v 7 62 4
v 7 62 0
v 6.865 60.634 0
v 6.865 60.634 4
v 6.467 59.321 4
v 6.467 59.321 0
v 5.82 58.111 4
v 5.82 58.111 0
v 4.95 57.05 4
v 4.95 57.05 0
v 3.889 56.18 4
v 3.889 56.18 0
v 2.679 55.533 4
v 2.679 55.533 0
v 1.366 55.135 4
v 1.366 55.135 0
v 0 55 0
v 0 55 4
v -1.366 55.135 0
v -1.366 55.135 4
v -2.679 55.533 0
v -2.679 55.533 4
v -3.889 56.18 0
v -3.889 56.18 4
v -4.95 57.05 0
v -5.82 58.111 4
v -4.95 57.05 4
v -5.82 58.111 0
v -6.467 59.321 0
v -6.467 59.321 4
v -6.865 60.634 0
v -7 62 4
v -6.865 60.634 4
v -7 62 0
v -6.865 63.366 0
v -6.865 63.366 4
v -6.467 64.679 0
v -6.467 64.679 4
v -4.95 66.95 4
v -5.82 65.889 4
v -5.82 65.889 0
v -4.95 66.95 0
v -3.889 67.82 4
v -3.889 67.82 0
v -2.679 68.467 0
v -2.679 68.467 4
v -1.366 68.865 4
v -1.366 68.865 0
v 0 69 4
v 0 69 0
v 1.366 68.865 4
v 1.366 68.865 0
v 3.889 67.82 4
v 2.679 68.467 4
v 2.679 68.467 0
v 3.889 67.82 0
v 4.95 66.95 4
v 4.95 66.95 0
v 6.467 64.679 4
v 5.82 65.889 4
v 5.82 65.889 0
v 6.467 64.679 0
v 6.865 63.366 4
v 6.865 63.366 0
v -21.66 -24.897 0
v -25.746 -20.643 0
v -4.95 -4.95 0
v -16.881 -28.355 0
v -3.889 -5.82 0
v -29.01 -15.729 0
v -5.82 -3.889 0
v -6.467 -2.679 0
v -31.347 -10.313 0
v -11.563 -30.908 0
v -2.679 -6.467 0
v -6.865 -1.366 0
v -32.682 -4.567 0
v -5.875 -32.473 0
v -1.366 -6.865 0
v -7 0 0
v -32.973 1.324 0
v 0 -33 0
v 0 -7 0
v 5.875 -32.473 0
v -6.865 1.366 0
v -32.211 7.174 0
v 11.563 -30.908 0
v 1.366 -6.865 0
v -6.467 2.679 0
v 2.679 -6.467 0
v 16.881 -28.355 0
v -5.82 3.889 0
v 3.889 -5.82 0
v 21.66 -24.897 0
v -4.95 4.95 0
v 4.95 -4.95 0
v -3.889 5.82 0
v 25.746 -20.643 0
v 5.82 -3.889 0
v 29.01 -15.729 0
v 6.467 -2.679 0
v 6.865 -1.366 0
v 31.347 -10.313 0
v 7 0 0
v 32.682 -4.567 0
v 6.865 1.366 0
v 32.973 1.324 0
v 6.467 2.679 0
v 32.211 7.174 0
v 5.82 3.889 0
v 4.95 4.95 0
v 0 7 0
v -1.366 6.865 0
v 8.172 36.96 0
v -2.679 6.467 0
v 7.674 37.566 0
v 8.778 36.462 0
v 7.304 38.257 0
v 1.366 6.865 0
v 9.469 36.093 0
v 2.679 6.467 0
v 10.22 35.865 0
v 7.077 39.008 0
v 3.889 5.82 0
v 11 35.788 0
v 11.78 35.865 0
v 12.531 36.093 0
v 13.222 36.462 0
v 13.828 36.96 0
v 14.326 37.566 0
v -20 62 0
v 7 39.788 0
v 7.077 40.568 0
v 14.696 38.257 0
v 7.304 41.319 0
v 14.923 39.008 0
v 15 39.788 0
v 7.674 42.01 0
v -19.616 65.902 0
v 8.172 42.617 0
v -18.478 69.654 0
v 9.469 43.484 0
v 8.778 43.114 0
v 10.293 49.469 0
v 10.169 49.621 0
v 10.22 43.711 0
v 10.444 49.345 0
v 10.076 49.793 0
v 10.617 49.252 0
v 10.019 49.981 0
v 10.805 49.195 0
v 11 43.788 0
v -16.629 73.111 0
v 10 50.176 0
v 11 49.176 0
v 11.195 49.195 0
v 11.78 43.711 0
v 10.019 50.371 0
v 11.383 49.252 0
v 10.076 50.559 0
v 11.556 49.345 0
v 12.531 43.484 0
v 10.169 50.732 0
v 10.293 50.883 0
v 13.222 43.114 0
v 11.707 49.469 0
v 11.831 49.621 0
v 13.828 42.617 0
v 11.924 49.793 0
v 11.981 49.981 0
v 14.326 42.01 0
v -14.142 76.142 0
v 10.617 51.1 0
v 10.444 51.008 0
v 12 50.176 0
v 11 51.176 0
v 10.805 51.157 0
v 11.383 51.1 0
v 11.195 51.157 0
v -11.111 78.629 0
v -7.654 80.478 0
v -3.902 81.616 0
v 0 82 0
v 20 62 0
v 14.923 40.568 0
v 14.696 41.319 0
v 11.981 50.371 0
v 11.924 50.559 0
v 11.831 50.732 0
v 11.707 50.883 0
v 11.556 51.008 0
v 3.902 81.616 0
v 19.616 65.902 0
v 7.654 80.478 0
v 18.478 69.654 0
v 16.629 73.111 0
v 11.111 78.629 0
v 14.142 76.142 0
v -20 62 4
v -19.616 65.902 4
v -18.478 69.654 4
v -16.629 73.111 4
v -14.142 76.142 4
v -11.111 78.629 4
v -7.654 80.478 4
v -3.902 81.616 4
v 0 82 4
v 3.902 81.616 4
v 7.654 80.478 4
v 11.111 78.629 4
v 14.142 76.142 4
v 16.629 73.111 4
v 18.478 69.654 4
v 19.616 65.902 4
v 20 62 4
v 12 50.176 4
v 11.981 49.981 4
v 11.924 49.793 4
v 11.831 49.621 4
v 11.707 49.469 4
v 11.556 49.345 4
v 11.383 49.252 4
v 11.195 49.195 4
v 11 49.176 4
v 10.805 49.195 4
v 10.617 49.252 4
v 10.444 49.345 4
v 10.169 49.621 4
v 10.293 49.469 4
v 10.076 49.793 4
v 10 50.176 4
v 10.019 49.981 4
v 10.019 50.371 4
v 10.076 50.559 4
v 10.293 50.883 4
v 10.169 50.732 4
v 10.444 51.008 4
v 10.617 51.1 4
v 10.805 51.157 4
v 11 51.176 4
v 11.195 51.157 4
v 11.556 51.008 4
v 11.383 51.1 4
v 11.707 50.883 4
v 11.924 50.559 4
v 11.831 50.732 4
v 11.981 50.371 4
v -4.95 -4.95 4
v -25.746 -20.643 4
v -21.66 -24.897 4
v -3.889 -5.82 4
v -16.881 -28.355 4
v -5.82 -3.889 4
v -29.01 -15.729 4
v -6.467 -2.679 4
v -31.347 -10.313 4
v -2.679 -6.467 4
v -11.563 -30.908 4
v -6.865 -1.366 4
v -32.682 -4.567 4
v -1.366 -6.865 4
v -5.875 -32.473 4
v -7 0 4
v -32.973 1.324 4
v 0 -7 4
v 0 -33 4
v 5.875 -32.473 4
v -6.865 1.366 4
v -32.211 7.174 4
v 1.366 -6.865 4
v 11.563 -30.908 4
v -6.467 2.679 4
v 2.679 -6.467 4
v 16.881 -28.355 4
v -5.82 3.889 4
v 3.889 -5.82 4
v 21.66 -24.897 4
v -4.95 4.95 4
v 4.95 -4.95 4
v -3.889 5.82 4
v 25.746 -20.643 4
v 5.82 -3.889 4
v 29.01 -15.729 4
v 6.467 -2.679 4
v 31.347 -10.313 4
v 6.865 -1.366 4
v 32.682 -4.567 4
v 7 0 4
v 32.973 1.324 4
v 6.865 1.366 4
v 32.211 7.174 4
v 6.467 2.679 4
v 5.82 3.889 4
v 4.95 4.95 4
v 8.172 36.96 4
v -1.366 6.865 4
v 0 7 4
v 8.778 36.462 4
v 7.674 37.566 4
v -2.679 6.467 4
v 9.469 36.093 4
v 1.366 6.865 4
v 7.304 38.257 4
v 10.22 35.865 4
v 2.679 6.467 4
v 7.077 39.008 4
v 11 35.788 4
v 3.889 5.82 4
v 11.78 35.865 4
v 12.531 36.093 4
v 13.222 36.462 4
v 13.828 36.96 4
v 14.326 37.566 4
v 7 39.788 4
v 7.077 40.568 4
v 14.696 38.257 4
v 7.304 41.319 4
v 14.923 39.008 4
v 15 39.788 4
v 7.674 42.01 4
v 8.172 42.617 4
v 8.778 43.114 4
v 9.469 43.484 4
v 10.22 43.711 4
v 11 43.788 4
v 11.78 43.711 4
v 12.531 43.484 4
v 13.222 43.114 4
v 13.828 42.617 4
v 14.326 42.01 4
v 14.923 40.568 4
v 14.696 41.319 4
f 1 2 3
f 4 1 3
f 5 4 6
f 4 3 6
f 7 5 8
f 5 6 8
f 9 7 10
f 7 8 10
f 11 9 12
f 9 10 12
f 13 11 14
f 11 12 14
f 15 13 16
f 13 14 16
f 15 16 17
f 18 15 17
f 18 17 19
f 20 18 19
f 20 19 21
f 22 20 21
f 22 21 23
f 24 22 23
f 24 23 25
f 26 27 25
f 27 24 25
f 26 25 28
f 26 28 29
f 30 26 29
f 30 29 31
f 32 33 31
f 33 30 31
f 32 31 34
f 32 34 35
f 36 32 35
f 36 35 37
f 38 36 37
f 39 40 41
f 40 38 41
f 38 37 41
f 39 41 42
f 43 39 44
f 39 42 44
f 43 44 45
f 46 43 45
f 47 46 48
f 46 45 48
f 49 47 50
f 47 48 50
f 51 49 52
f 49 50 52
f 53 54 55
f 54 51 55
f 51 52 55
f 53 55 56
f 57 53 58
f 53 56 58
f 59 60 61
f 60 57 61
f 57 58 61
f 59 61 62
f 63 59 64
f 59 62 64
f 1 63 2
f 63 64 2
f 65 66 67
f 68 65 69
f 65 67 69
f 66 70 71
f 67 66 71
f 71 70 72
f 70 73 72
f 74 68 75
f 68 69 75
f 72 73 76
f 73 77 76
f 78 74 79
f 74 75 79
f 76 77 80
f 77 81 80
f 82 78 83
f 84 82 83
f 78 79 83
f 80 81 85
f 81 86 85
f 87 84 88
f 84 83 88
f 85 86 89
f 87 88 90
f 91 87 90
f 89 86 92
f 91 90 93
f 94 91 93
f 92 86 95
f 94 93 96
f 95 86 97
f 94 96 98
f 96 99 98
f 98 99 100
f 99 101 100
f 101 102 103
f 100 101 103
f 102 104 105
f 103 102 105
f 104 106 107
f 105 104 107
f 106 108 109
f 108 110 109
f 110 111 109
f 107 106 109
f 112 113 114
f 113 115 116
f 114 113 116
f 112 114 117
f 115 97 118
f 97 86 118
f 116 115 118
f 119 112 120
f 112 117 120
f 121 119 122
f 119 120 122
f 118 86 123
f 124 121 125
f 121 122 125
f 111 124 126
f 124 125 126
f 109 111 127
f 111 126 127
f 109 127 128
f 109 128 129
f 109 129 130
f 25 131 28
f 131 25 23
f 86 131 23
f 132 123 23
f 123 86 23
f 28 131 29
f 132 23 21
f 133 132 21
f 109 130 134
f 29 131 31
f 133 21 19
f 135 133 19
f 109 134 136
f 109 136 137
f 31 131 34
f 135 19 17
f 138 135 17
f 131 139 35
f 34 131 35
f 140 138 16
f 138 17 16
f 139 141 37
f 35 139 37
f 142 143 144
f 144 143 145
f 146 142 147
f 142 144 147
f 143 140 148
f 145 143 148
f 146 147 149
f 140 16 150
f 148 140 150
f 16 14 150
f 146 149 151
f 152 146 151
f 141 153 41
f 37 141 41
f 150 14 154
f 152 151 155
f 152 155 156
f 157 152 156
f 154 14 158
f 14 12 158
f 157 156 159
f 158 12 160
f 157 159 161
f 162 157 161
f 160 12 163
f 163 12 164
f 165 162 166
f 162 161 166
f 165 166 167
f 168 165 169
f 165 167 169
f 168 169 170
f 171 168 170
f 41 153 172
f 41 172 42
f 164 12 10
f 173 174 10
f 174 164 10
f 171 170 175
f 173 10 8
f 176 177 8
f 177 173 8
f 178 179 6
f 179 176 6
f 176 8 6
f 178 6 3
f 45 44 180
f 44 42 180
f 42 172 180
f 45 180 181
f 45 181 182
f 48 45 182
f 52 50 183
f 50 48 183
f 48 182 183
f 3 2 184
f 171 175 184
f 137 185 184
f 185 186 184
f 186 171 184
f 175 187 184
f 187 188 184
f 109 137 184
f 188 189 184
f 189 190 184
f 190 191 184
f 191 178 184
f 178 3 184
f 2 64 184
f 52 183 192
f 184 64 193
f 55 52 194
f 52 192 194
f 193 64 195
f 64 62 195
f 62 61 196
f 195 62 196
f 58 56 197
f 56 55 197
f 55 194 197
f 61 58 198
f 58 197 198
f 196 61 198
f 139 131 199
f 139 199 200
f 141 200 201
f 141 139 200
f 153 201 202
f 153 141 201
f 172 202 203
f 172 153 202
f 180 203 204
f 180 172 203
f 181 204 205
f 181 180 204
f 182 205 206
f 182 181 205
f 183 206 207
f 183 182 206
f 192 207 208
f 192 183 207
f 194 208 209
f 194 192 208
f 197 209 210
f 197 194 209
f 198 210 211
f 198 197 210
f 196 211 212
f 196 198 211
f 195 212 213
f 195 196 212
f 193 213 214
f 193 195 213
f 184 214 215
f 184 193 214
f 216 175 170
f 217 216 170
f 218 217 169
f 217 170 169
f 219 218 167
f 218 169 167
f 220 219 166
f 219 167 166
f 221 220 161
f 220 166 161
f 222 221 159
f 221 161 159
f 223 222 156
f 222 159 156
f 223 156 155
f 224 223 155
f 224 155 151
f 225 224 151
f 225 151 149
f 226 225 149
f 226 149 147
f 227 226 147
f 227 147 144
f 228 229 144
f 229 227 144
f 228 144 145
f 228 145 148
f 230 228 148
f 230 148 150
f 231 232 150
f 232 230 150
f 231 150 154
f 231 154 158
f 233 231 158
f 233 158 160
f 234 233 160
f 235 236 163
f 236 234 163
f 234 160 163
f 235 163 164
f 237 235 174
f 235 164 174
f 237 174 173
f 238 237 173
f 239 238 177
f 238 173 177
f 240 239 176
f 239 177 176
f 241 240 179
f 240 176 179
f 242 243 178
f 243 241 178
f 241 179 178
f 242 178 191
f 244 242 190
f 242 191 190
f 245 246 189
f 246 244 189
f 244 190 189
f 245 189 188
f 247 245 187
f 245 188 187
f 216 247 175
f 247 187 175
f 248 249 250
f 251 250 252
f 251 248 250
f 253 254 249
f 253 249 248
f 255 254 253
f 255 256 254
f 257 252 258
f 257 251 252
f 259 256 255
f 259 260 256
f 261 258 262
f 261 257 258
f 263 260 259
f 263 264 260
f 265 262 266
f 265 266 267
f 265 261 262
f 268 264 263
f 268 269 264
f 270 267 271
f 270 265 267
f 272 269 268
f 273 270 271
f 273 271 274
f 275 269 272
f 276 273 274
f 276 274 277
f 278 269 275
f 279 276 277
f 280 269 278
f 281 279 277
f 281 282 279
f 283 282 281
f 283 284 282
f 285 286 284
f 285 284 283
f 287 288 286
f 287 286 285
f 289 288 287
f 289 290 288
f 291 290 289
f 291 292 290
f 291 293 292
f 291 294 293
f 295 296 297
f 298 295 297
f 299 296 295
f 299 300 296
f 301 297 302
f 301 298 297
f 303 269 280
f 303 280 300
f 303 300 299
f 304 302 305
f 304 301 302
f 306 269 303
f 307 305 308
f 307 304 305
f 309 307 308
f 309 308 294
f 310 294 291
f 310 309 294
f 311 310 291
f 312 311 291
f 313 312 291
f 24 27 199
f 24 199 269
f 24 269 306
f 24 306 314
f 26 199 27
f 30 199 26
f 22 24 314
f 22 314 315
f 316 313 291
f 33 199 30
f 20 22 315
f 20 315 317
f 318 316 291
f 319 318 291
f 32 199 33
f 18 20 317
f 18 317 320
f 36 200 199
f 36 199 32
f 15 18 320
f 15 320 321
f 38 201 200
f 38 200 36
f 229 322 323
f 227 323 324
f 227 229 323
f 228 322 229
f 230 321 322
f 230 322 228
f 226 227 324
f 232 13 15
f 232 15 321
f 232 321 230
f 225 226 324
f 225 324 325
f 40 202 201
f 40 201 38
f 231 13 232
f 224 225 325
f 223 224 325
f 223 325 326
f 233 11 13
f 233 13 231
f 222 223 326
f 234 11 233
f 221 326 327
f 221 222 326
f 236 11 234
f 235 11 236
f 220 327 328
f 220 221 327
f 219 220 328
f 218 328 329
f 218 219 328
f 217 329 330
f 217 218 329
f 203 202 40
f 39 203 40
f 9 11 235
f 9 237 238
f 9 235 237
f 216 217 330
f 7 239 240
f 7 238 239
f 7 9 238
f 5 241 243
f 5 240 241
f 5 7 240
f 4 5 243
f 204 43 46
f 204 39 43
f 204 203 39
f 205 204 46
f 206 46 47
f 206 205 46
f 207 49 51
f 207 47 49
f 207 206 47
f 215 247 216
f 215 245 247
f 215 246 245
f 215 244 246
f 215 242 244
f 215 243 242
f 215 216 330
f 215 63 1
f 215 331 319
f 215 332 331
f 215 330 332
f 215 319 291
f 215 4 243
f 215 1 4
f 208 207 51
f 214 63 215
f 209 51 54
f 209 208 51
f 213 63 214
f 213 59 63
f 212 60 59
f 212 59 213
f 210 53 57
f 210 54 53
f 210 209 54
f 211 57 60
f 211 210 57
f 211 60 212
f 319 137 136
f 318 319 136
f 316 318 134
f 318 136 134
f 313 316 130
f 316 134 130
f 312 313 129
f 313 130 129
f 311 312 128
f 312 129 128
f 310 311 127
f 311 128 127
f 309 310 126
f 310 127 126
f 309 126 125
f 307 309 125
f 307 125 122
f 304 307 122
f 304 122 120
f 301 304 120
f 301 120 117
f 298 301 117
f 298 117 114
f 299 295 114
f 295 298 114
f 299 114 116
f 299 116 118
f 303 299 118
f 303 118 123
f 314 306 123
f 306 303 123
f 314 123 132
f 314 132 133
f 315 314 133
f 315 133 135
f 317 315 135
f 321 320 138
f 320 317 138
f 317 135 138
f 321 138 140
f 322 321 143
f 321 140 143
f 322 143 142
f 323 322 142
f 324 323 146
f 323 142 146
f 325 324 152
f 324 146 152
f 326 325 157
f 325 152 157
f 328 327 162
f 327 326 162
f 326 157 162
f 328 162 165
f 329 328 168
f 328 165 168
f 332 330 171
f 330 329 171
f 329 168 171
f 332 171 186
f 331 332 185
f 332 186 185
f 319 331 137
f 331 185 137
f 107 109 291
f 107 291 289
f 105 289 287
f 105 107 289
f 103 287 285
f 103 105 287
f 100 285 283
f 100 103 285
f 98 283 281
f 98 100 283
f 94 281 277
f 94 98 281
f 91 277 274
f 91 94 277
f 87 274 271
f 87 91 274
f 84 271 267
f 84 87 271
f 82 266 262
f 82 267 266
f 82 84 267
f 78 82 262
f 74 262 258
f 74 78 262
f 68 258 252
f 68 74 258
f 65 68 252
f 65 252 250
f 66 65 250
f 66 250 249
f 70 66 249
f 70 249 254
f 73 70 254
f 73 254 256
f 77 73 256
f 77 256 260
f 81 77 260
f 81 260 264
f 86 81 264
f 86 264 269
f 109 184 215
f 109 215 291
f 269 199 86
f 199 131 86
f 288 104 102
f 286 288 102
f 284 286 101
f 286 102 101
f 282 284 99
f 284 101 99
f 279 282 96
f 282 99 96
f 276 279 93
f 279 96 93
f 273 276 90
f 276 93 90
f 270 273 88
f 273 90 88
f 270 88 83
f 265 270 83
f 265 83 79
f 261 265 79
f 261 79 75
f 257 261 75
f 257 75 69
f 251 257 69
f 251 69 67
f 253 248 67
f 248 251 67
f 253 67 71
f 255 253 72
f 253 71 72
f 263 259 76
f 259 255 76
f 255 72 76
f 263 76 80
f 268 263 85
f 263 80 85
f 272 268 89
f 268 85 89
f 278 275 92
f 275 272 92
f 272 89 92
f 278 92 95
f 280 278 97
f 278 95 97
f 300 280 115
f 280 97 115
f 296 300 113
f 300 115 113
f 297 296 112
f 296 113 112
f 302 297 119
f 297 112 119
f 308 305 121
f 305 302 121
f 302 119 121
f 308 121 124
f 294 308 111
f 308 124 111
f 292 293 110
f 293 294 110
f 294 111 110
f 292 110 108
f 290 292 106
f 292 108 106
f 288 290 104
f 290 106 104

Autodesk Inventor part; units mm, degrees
ref_plane "YZ Plane" through (0, 0, 0) normal (1, 0, 0) x (0, 1, 0)
ref_plane "XZ Plane" through (0, 0, 0) normal (0, 1, 0) x (-1, 0, 0)
ref_plane "XY Plane" through (0, 0, 0) normal (0, 0, 1) x (1, 0, 0)
sketch "Sketch1" plane through (0, 0, 0) normal (0, 0, 1) x (1, 0, 0)
  arc A0 (-32.2108, 7.1739) -> (32.2108, 7.1739) centre (0, 0) ccw
  arc A1 (20, 62) -> (-20, 62) centre (0, 62) ccw
  line L0 (20, 62) -> (32.2108, 7.1739)
  line L1 (-20, 62) -> (-32.2108, 7.1739)
  circle A2 centre (0, 0) radius 7
  circle A3 centre (0, 62) radius 7
  circle A4 centre (11, 39.7881) radius 4
  circle A5 centre (11, 50.1761) radius 1
  dimension "d0" = 66
  dimension "d1" = 40
  dimension "d2" = 62
  dimension "d3" = 14
  dimension "d4" = 14
  dimension "d5" = 8
  dimension "d6" = 2
  dimension "d7" = 11
extrude "Extrusion1" add sketch "Sketch1" along normal blind 4
properties part number "Placa de soporte"
